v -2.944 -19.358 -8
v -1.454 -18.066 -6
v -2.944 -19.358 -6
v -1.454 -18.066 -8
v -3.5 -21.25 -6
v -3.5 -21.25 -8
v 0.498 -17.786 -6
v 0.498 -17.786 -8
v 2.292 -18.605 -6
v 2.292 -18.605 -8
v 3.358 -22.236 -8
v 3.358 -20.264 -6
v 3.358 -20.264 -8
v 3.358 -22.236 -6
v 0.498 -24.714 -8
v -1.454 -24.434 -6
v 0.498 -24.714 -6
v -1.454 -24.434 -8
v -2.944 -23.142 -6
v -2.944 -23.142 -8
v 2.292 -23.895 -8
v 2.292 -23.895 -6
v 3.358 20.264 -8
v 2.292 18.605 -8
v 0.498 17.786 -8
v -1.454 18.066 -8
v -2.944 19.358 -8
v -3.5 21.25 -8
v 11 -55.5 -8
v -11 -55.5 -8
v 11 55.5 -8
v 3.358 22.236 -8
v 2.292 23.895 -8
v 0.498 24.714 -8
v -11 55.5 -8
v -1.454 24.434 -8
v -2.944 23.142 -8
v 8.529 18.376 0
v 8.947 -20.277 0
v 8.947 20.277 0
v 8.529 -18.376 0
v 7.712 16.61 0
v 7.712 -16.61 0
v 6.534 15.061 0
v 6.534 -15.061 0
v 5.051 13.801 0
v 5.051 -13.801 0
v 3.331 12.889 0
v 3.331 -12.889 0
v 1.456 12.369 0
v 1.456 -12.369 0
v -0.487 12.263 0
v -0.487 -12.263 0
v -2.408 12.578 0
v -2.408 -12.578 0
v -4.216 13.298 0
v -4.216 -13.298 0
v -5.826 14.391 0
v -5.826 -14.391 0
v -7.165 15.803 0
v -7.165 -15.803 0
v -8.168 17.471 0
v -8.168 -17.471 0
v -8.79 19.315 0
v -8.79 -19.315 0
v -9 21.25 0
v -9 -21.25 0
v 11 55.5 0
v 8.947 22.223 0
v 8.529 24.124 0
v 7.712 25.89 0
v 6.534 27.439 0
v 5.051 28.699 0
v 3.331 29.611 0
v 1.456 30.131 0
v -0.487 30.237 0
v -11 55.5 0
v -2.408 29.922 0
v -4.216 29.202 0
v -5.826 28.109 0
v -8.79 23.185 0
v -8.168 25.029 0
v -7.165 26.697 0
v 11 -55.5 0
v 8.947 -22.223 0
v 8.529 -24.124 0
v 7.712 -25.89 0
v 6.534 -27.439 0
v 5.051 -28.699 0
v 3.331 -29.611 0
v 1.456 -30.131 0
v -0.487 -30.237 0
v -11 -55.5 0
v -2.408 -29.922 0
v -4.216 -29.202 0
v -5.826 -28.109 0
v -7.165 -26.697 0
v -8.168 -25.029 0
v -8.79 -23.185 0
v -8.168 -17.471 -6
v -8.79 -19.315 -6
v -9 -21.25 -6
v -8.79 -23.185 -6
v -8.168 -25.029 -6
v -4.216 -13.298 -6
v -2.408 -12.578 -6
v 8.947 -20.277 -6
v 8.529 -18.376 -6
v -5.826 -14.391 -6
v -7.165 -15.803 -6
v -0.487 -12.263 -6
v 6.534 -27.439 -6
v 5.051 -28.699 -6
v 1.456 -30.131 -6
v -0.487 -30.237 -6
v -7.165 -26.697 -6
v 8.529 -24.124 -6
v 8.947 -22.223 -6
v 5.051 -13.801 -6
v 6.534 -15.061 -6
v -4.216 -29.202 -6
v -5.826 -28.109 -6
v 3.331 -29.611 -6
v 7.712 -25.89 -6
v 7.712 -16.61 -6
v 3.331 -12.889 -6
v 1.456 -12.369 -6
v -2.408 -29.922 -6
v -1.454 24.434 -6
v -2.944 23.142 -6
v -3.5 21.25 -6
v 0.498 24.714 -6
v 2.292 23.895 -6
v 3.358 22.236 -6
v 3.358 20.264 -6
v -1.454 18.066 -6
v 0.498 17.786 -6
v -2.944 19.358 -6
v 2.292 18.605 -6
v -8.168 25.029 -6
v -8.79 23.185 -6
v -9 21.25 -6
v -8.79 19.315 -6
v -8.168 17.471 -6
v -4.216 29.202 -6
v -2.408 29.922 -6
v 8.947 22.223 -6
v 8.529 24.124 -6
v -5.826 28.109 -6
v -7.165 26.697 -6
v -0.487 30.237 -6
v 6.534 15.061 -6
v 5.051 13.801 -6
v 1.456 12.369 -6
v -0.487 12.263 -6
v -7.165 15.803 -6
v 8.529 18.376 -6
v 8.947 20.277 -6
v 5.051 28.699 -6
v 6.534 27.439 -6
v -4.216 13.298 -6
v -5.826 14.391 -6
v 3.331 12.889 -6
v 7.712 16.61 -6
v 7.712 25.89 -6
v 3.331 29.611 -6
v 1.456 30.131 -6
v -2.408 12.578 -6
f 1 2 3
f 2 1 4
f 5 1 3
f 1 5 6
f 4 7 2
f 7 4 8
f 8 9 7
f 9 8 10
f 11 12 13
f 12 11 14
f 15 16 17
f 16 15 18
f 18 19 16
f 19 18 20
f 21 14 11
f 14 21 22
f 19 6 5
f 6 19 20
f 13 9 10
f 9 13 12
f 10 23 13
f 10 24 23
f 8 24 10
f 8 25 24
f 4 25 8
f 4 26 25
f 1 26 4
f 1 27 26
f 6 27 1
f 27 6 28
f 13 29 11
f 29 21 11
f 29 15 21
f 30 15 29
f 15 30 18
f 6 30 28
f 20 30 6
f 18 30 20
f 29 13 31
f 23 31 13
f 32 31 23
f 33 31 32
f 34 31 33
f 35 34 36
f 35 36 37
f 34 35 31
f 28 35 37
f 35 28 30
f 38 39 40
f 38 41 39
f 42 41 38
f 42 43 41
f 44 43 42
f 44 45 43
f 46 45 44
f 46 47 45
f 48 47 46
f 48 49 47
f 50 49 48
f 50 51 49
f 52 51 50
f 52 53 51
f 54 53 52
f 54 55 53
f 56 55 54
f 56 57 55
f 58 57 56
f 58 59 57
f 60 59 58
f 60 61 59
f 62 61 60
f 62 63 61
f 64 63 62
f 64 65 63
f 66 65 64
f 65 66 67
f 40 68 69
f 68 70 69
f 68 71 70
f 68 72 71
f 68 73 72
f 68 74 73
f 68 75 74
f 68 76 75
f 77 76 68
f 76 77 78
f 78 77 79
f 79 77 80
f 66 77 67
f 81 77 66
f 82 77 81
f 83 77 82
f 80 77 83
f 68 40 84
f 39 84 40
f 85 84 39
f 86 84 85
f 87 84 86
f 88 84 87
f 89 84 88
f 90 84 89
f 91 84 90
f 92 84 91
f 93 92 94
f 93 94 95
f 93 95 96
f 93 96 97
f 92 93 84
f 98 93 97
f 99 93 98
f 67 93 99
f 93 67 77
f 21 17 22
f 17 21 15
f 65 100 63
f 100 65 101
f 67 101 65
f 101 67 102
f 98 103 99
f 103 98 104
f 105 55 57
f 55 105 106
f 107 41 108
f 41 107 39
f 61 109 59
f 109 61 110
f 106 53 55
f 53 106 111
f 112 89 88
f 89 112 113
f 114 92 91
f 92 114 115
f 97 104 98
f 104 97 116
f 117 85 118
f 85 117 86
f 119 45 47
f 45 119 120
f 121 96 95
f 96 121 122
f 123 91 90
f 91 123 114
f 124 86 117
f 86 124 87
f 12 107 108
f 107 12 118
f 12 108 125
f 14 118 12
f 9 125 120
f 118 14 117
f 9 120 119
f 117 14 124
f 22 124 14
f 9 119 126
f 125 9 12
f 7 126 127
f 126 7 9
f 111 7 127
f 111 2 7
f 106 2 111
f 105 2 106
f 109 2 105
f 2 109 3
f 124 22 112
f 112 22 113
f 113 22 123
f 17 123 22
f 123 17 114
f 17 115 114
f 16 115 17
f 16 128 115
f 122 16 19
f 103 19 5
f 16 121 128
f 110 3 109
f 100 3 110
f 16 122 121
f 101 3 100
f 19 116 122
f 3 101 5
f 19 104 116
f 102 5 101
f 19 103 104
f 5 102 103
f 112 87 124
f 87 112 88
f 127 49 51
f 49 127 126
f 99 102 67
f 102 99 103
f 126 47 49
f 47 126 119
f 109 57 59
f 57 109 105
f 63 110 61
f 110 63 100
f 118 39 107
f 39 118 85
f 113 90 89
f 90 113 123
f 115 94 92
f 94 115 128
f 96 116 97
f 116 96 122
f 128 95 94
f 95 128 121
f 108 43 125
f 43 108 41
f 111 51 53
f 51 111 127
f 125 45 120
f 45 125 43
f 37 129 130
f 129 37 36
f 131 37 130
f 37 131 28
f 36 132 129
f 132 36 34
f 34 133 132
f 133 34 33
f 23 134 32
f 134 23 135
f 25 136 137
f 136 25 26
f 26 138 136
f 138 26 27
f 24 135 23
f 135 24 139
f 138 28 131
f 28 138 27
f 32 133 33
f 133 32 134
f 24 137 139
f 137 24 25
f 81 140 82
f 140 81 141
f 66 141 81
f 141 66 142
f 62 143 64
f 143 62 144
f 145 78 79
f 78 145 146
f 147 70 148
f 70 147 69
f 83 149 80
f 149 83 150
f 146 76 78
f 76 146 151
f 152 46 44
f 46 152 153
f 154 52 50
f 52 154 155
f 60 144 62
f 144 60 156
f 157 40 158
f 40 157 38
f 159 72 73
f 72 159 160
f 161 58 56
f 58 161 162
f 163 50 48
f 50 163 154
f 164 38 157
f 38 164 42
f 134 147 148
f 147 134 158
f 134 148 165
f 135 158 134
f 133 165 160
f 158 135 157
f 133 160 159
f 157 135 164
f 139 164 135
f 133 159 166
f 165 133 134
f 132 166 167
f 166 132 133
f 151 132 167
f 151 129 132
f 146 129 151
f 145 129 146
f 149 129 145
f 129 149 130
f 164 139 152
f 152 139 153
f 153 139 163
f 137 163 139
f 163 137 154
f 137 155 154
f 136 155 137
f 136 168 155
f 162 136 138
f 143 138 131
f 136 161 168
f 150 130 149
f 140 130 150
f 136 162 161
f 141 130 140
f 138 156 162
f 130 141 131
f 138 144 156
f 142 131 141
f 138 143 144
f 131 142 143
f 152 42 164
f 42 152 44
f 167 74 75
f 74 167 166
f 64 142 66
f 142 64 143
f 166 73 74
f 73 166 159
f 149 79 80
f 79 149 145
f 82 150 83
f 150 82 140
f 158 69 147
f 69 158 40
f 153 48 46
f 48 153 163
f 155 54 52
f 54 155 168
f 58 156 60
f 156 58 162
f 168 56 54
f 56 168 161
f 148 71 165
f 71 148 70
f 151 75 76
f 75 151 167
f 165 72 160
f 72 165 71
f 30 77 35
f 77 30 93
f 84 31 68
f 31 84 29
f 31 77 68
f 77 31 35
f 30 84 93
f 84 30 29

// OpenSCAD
length = 111;
module highBandStand(){
cube([22, length, 8]);
translate([0,30,8]){
    difference(){
    cube([22, 22, 16]);
    translate([11, 25, 7])rotate([90,0,0])cylinder(30, 4.2/2, 4.2/2);
    }
}
}

module screwHole(){
     cylinder(8,3.5, 3.5);
     cylinder(6,9, 9);
}

module lowBandStand(){
    s=(48.5-6)/2;
difference(){
translate([-22/2,-length/2]) cube([22, length, 8]);
translate([0,-s,0])screwHole();
    translate([0,s,0])screwHole();
}
}
rotate([0,180,0]) lowBandStand();
//highBandStand();
